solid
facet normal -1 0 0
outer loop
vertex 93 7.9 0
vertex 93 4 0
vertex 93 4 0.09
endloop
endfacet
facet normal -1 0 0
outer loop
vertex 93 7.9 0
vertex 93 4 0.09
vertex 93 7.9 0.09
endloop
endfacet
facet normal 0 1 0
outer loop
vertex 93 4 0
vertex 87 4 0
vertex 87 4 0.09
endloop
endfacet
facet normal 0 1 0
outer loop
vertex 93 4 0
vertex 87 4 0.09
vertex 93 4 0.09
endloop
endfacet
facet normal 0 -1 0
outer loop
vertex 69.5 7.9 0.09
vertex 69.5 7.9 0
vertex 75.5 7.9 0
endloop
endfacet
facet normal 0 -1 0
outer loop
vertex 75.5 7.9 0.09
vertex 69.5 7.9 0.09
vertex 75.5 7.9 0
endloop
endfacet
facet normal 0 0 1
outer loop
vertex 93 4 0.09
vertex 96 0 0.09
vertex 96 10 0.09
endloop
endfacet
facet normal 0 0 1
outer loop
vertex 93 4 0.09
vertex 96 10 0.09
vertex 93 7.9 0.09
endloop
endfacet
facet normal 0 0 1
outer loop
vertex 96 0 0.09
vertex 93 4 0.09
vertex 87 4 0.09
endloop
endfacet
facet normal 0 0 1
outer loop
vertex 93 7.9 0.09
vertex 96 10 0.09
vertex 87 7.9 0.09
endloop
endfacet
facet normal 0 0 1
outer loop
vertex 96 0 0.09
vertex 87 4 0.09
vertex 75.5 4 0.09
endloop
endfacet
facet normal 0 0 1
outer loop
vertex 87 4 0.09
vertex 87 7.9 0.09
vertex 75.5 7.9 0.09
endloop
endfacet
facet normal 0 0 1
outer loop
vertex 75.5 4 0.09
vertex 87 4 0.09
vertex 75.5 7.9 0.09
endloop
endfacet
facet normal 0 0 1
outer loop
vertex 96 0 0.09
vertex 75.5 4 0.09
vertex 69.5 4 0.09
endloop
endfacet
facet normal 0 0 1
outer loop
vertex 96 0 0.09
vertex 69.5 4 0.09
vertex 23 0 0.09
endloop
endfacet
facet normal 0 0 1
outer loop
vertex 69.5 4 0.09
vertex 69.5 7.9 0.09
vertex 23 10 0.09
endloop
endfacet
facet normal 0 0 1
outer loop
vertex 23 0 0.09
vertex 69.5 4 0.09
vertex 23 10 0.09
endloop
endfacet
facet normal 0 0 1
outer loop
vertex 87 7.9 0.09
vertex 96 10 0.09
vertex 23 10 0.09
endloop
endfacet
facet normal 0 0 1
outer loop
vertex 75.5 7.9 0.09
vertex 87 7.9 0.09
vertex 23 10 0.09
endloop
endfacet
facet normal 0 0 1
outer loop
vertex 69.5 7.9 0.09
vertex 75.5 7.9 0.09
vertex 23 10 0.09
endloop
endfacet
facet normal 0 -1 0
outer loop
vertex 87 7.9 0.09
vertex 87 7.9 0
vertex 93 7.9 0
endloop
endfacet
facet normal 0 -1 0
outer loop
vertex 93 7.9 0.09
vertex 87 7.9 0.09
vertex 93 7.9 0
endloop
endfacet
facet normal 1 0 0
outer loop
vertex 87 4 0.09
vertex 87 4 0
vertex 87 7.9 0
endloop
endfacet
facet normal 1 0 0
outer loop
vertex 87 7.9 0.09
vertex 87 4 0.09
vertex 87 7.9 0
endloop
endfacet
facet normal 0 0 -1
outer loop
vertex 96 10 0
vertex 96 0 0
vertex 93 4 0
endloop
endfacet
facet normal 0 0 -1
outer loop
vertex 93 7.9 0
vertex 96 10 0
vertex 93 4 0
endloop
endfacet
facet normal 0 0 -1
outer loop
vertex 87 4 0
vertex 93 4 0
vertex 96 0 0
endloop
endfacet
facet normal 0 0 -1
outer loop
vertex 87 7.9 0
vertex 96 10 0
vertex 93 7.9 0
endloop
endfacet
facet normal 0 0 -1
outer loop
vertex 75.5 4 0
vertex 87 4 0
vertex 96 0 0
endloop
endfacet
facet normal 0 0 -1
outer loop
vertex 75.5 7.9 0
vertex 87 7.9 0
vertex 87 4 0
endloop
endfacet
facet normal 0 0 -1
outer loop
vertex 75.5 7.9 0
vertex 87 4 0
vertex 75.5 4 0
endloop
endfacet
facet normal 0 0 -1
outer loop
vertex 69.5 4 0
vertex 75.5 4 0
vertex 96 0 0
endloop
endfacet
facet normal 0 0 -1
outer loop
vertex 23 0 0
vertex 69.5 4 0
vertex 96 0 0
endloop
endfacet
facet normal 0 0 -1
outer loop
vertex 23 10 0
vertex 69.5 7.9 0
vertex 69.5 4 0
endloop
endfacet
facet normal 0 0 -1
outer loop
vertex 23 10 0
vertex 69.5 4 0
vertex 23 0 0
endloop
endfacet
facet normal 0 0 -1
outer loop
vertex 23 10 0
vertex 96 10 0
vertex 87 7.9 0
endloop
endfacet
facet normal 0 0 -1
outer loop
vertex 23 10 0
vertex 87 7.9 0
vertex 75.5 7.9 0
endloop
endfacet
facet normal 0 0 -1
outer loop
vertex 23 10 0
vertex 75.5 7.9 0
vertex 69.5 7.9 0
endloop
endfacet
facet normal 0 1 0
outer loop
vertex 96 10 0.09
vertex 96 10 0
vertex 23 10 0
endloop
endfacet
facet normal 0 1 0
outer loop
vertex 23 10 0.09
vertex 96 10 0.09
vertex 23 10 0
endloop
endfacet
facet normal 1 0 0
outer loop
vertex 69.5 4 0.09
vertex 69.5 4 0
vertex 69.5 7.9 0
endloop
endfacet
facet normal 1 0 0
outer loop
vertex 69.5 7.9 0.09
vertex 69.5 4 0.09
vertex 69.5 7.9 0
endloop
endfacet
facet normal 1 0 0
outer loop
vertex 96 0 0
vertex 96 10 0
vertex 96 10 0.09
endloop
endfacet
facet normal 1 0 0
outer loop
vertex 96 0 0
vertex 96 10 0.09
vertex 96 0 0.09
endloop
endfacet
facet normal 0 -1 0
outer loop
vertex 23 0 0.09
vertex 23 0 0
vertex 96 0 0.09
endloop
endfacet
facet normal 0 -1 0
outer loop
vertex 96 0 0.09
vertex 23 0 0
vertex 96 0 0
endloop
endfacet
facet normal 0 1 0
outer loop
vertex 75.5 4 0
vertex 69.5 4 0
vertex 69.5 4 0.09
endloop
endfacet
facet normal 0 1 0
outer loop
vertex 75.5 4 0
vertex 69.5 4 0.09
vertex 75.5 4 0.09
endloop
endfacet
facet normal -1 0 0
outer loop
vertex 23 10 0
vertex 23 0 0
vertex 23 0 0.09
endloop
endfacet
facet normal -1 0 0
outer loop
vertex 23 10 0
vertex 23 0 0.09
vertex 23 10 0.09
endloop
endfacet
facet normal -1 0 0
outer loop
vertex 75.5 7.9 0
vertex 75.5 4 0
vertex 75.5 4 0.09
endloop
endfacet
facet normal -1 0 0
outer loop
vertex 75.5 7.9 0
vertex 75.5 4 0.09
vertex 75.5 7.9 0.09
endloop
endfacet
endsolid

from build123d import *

# Parameters (mm, degrees)
SKETCH1_W           = 6
SKETCH1_H           = 3.9
BOSS_EXTRUDE1_DEPTH = 0.09


with BuildPart() as part:
    # Sketch1 → Boss-Extrude1 (new body)
    with BuildSketch(Plane.XY):
        Polygon((96, 0), (30, 0), (23, 0), (23, 10), (30, 10), (96, 10), align=None)
        with Locations((90, 5.95)):
            Rectangle(SKETCH1_W, SKETCH1_H, mode=Mode.SUBTRACT)
        with Locations((72.5, 5.95)):
            Rectangle(SKETCH1_W, SKETCH1_H, mode=Mode.SUBTRACT)
    extrude(amount=BOSS_EXTRUDE1_DEPTH)


solid = part.part
